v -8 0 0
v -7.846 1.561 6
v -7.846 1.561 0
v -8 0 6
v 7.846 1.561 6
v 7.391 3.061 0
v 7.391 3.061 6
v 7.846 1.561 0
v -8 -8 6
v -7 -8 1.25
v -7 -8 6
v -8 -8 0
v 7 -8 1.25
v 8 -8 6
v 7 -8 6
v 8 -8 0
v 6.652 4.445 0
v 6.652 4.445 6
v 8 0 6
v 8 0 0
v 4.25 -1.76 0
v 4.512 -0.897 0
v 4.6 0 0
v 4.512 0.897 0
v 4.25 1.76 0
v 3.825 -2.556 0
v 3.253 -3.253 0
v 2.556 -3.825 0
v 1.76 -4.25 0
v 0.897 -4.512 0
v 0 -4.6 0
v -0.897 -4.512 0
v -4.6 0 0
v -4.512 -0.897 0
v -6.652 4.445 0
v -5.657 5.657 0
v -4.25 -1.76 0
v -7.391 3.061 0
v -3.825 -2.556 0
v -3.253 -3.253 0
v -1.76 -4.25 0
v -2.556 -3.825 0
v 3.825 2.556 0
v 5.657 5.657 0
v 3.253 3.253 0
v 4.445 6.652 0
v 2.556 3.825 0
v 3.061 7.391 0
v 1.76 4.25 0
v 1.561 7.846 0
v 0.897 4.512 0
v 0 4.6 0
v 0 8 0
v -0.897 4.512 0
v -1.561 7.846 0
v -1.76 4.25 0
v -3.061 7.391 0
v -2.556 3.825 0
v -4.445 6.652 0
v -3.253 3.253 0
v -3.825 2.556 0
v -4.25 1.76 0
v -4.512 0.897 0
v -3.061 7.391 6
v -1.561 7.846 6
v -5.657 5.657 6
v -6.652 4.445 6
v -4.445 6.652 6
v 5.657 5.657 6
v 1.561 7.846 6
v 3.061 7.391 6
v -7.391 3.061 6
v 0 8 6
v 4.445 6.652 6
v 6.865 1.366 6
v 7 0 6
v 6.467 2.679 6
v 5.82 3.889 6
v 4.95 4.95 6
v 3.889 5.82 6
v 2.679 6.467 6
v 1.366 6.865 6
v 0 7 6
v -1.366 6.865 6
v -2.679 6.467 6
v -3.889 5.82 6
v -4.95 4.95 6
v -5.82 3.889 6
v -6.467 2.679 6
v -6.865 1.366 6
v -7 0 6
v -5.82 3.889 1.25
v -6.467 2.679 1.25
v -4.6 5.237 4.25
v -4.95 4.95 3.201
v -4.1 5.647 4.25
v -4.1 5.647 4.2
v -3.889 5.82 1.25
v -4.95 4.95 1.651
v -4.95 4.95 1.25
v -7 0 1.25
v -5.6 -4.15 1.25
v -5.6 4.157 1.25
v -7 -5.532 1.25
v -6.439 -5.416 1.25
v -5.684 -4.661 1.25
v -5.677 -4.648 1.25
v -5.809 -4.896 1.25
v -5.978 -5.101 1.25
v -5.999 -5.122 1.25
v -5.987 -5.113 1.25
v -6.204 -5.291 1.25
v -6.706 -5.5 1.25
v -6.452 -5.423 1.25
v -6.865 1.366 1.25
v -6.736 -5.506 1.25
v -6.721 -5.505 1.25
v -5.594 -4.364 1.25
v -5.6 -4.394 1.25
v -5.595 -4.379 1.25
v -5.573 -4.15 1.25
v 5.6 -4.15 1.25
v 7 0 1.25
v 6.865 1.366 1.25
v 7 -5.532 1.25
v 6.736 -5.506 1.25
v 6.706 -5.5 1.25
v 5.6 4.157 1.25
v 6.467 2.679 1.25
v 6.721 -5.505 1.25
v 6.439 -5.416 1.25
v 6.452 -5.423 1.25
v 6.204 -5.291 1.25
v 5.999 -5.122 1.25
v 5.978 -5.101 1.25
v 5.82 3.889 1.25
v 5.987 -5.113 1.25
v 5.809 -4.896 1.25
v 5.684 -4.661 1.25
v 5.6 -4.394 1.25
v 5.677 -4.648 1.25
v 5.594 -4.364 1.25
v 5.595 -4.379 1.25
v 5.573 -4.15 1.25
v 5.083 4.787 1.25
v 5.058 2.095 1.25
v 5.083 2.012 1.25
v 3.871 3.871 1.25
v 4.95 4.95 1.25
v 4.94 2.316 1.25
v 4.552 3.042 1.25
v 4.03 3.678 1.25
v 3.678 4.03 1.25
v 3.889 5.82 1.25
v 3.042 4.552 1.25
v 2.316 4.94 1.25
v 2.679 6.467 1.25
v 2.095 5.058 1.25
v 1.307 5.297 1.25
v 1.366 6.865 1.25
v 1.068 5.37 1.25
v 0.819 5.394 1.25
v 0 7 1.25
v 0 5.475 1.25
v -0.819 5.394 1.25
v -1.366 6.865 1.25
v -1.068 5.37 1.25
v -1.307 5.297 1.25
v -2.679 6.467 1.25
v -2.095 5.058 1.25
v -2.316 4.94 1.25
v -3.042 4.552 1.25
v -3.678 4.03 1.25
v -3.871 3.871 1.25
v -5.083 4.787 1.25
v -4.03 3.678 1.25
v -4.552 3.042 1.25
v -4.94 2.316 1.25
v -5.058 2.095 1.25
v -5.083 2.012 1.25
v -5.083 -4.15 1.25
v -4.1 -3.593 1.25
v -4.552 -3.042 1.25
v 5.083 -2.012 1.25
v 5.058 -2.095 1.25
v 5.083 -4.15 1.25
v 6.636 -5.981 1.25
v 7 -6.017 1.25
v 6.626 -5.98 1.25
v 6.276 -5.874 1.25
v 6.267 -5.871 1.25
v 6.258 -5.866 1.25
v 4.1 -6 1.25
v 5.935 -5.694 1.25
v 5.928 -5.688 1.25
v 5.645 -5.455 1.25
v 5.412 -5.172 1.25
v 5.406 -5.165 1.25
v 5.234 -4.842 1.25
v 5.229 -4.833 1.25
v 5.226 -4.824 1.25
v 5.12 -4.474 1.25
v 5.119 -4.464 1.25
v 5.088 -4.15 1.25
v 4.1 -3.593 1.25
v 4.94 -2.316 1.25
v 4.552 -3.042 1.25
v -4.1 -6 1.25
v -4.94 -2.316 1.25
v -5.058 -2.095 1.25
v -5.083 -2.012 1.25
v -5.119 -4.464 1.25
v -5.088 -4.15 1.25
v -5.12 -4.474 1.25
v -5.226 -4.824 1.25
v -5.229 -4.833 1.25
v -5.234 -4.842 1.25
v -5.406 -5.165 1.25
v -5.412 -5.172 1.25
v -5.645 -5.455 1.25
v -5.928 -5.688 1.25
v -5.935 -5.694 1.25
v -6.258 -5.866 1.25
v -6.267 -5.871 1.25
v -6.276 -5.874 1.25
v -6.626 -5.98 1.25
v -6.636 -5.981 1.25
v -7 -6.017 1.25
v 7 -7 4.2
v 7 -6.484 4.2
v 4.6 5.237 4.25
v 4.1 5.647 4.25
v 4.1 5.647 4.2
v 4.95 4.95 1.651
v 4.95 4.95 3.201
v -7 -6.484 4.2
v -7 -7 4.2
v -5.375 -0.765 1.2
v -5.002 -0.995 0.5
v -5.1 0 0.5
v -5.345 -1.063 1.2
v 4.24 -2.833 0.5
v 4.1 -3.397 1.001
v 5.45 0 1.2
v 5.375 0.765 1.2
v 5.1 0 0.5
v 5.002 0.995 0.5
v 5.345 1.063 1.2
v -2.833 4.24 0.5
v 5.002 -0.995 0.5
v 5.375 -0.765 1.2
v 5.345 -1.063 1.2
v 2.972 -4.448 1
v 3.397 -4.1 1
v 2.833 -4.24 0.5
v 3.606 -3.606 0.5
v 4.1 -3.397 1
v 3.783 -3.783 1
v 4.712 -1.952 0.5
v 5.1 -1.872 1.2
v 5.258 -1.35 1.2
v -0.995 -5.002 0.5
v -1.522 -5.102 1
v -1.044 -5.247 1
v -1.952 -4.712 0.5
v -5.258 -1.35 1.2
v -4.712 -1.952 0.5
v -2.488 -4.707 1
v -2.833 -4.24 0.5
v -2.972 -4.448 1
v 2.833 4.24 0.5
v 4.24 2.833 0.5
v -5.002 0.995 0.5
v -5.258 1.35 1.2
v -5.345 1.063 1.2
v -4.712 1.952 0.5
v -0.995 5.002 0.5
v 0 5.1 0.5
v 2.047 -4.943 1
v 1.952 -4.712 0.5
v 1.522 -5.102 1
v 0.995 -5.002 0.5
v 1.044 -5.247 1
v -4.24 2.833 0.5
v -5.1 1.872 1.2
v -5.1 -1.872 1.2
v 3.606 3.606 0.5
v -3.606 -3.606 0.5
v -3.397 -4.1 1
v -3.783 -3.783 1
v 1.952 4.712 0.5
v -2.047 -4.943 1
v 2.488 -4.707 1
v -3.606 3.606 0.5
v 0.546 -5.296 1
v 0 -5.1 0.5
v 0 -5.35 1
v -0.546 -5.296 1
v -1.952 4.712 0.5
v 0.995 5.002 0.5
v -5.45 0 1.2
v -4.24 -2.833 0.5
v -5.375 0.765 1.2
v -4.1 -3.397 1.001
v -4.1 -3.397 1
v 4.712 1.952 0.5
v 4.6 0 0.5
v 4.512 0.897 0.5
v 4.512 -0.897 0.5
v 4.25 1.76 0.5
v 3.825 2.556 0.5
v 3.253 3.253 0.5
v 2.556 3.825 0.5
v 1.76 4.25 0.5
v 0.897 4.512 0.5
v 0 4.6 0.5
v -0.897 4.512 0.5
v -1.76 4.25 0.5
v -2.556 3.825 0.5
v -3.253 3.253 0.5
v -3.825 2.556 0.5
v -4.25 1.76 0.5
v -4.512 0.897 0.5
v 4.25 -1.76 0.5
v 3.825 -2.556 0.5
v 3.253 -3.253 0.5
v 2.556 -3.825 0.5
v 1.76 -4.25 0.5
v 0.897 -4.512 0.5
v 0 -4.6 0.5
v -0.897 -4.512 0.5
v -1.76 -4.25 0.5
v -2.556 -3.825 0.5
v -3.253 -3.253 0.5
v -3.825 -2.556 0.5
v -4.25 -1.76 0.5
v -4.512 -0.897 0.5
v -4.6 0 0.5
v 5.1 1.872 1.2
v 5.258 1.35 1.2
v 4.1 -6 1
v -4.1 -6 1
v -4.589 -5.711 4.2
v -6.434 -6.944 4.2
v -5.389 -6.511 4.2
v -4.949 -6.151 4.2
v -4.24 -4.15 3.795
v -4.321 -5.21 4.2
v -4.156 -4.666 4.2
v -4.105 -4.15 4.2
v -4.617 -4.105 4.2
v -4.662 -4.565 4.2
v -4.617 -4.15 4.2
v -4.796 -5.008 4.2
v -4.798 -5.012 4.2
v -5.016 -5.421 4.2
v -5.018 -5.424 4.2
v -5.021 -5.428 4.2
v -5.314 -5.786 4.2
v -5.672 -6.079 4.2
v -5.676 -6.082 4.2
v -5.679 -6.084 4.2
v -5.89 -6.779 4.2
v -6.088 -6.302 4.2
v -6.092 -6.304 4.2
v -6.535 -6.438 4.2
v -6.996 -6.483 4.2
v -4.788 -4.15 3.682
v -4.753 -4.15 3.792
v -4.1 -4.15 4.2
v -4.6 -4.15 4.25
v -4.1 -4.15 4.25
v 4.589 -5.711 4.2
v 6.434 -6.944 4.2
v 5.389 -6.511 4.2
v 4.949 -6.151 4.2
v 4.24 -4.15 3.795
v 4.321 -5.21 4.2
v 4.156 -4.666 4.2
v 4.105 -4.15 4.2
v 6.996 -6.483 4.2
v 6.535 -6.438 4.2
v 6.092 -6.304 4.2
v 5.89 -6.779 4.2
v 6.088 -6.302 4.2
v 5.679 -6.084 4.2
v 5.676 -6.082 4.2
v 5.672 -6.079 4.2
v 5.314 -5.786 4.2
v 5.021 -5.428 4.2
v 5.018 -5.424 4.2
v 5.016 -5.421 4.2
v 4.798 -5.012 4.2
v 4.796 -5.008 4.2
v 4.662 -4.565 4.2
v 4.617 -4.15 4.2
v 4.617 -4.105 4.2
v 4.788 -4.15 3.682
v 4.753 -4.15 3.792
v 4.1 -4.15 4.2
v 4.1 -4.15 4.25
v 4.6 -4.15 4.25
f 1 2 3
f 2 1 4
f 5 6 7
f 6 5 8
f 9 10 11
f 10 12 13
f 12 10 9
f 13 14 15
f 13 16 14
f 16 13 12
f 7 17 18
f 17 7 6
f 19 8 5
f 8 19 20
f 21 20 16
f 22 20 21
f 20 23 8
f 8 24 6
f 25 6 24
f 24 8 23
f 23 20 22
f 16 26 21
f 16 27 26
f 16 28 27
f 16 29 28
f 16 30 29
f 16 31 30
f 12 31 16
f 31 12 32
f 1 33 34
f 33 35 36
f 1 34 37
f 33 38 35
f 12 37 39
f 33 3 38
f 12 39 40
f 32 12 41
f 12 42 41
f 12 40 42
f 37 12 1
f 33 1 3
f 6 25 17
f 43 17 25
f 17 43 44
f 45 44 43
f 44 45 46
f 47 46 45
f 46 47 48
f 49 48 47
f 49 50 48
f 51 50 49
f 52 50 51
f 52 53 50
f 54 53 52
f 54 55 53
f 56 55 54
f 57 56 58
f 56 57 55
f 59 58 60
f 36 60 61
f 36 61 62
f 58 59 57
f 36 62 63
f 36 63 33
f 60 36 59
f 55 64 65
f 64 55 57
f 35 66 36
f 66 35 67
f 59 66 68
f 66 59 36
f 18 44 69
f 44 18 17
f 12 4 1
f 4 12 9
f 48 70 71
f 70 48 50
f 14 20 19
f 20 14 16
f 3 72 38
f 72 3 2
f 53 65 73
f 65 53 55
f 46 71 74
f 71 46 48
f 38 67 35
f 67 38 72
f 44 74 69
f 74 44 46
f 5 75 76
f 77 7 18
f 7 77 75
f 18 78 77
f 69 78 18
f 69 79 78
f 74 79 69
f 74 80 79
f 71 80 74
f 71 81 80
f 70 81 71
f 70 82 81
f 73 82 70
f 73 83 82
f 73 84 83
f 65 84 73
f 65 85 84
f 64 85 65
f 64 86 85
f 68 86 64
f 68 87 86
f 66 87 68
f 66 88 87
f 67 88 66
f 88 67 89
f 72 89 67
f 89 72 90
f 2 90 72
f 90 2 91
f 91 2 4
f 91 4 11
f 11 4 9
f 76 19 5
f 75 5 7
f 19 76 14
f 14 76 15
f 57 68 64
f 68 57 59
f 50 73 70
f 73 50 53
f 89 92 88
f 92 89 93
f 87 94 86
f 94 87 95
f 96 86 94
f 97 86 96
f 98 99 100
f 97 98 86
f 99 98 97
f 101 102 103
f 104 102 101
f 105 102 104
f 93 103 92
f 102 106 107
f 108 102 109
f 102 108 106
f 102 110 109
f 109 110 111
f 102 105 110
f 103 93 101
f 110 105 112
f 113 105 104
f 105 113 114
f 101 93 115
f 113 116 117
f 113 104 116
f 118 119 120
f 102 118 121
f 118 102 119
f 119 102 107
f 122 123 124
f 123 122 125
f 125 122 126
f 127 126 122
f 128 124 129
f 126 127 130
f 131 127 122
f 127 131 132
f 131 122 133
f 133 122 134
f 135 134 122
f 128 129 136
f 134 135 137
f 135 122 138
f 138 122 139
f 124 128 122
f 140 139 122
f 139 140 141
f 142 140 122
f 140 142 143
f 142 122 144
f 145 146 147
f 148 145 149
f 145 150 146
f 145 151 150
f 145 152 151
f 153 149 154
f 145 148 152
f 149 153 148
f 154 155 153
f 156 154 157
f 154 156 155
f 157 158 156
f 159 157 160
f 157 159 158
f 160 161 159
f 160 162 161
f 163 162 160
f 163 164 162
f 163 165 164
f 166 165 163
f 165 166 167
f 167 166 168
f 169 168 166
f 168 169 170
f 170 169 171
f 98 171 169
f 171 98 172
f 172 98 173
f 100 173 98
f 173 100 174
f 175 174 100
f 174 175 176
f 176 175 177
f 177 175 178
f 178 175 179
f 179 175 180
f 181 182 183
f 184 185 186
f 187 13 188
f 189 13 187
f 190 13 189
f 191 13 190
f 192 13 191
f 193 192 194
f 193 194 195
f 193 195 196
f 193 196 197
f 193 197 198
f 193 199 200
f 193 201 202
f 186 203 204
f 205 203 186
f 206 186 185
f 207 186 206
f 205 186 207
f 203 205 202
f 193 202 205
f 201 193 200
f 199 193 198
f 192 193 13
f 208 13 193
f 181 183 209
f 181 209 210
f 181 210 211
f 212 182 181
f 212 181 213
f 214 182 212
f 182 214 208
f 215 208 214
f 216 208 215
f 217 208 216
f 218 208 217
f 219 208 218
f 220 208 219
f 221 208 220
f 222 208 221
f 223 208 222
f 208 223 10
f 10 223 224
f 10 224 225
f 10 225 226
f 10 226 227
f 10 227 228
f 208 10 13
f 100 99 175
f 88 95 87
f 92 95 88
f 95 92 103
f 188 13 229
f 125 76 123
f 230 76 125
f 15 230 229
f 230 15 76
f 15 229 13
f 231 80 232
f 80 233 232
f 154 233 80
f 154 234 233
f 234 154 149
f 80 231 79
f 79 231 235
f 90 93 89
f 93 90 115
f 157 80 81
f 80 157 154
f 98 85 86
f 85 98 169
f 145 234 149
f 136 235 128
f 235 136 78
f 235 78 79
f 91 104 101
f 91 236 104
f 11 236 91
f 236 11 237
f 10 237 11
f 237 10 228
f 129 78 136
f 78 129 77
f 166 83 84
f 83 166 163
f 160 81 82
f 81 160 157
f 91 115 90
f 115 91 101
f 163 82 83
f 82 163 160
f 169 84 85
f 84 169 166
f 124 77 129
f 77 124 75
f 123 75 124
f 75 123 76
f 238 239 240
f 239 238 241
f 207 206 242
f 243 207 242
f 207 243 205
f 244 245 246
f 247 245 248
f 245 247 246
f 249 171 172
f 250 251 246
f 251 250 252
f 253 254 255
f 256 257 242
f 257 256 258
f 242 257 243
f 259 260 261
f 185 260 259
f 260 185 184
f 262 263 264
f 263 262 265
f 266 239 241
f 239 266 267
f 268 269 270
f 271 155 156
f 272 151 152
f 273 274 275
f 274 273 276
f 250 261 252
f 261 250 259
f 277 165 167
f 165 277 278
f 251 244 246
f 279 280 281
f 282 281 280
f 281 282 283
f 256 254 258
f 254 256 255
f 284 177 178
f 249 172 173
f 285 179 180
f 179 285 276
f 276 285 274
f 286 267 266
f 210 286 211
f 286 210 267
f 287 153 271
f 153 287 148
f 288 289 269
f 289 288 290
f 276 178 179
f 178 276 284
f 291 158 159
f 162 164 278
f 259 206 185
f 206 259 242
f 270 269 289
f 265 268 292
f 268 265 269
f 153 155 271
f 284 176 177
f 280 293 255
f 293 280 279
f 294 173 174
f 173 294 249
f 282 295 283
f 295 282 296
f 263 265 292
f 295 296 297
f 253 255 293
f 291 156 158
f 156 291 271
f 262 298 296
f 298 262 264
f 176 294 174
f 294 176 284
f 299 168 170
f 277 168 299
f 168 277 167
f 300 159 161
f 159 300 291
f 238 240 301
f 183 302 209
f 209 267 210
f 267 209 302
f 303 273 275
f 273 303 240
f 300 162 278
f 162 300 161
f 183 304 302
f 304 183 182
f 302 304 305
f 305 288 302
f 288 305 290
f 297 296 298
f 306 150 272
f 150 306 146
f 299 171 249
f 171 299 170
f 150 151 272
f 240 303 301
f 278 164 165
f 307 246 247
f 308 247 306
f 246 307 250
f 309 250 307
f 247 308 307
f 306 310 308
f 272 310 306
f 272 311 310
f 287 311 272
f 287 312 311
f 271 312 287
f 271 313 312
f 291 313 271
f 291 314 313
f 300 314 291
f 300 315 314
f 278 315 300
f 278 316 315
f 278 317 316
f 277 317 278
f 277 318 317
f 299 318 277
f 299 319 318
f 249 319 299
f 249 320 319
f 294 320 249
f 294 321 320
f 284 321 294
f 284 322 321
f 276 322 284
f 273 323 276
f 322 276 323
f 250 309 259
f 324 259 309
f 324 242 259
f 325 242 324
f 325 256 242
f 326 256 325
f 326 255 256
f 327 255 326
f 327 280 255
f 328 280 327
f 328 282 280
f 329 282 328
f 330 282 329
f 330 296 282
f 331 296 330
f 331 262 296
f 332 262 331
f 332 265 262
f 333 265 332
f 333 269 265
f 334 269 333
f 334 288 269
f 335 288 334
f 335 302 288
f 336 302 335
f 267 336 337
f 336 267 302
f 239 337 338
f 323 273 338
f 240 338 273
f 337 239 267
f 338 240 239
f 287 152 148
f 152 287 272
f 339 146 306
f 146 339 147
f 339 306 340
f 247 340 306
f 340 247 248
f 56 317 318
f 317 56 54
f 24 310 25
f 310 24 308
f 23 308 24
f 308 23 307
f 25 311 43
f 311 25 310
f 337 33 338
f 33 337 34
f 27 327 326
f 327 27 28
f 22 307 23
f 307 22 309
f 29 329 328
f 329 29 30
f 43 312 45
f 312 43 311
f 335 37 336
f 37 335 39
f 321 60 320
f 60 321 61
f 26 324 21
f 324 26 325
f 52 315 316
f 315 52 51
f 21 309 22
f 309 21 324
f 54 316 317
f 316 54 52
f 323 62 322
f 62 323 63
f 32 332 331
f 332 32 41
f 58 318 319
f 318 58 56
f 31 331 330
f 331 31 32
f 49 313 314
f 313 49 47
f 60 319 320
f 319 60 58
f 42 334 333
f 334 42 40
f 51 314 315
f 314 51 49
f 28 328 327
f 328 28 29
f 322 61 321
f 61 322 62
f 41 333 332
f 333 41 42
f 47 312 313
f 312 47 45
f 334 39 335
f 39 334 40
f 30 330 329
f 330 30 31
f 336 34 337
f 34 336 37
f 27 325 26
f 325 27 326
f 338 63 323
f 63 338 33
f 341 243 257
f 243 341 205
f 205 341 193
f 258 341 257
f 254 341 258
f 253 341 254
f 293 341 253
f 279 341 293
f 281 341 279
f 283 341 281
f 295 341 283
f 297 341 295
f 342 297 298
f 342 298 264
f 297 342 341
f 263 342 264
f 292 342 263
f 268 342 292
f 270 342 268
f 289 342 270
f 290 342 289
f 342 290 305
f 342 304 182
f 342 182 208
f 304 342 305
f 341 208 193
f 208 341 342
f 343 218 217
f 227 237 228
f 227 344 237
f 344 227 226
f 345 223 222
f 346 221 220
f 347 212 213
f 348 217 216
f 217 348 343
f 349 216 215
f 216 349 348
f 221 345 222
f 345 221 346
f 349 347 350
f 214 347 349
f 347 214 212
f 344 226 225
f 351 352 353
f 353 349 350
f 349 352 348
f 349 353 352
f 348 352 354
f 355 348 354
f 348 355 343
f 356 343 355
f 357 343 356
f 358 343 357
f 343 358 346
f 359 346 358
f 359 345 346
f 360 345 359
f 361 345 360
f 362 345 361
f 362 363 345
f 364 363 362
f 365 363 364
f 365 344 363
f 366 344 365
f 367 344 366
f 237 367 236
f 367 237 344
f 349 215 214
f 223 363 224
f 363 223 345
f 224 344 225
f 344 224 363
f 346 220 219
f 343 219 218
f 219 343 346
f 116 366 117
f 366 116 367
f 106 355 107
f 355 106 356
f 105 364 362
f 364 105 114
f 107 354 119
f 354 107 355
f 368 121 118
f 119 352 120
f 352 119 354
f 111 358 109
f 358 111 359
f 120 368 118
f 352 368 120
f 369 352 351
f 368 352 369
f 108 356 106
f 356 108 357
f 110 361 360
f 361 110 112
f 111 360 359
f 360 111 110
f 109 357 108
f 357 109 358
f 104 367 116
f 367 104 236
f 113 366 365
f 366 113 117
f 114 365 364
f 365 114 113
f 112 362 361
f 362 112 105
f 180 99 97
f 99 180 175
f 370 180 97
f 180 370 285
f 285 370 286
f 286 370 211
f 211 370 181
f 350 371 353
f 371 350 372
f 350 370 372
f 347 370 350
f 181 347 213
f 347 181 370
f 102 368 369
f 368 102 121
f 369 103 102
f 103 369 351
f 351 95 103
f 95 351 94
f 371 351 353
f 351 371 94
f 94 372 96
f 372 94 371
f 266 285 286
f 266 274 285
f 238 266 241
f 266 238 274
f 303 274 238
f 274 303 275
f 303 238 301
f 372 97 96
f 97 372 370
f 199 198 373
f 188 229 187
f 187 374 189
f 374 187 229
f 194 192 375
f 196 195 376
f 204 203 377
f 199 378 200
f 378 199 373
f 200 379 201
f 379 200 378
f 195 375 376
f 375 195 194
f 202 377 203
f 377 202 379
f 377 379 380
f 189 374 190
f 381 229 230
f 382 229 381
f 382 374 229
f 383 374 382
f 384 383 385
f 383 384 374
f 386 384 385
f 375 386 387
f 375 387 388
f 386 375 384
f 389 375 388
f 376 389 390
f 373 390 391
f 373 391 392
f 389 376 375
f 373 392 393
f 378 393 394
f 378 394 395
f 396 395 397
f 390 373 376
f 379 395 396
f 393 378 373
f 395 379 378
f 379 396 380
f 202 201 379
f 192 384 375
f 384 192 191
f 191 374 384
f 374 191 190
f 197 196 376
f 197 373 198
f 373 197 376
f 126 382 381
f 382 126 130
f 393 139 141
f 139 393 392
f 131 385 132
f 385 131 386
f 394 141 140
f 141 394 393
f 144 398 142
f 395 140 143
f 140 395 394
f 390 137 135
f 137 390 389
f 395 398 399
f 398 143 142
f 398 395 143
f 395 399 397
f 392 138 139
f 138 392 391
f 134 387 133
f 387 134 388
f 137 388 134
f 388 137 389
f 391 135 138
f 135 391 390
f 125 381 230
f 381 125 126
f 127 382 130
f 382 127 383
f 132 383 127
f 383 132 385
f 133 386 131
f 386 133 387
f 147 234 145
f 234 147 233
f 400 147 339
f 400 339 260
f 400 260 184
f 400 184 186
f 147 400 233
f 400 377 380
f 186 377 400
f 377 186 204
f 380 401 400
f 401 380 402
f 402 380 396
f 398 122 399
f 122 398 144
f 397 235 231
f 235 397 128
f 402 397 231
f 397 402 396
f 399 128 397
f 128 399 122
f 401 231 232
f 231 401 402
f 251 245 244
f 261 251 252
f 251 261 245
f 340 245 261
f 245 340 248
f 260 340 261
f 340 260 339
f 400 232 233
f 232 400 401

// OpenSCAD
use <utilities.scad>;

$fn=32;
d=0.05;

tube_lens_r=5+0.1;
tube_lens_edge_h=2;
tube_lens_centre_h=4;
gripper_t=1;

union(){
    difference(){
        hull(){
            cylinder(r=8,h=6);
            translate([-8,-8,0]) cube([16,8,6]);
        }
        intersection(){
            hull(){
                translate([0,0,1.25]) cylinder(r=7,h=999);
                translate([-7,-9,1.25]) cube([14,7,999]);
            }
        }
        //indent and hole for lens
        translate([0,0,0.5]) cylinder(r1=tube_lens_r,r2=tube_lens_r+0.5,h=1);
        translate([0,0,-d]) cylinder(r=tube_lens_r-0.5,h=1);
        
        //relief so it can slide in without scratches
        translate([-tube_lens_r+1,-6,1]) cube([tube_lens_r*2-2,6,0.5]); 
        
    }
    
    //gripper
    reflect([1,0,0]){
        top_r=7-tube_lens_r+1;
        translate([-7,-tube_lens_r+1,1.25-d]) difference(){
            intersection(){
                cylinder(r1=top_r-tube_lens_edge_h/2,
                         r2=top_r, h=tube_lens_edge_h+1);
                rotate(-90) cube(999);
            }
            translate([0,0,-d]) cylinder(r1=top_r-tube_lens_edge_h/2-0.5,
                     r2=top_r-0.5, h=tube_lens_edge_h+1+2*d);
        }
        intersection(){
            cylinder(r=7.5,h=999);
            hull(){
                translate([-7+top_r-0.5,-tube_lens_r+1-d,1.25+tube_lens_edge_h+1-d]) cube([0.5,999,d]);
                translate([-7+top_r-0.5-tube_lens_edge_h/2,-tube_lens_r+1-d,1.25-d]) cube([0.5,999,d]);
            }
        }
    }
}

%cylinder(r=5,h=6);
